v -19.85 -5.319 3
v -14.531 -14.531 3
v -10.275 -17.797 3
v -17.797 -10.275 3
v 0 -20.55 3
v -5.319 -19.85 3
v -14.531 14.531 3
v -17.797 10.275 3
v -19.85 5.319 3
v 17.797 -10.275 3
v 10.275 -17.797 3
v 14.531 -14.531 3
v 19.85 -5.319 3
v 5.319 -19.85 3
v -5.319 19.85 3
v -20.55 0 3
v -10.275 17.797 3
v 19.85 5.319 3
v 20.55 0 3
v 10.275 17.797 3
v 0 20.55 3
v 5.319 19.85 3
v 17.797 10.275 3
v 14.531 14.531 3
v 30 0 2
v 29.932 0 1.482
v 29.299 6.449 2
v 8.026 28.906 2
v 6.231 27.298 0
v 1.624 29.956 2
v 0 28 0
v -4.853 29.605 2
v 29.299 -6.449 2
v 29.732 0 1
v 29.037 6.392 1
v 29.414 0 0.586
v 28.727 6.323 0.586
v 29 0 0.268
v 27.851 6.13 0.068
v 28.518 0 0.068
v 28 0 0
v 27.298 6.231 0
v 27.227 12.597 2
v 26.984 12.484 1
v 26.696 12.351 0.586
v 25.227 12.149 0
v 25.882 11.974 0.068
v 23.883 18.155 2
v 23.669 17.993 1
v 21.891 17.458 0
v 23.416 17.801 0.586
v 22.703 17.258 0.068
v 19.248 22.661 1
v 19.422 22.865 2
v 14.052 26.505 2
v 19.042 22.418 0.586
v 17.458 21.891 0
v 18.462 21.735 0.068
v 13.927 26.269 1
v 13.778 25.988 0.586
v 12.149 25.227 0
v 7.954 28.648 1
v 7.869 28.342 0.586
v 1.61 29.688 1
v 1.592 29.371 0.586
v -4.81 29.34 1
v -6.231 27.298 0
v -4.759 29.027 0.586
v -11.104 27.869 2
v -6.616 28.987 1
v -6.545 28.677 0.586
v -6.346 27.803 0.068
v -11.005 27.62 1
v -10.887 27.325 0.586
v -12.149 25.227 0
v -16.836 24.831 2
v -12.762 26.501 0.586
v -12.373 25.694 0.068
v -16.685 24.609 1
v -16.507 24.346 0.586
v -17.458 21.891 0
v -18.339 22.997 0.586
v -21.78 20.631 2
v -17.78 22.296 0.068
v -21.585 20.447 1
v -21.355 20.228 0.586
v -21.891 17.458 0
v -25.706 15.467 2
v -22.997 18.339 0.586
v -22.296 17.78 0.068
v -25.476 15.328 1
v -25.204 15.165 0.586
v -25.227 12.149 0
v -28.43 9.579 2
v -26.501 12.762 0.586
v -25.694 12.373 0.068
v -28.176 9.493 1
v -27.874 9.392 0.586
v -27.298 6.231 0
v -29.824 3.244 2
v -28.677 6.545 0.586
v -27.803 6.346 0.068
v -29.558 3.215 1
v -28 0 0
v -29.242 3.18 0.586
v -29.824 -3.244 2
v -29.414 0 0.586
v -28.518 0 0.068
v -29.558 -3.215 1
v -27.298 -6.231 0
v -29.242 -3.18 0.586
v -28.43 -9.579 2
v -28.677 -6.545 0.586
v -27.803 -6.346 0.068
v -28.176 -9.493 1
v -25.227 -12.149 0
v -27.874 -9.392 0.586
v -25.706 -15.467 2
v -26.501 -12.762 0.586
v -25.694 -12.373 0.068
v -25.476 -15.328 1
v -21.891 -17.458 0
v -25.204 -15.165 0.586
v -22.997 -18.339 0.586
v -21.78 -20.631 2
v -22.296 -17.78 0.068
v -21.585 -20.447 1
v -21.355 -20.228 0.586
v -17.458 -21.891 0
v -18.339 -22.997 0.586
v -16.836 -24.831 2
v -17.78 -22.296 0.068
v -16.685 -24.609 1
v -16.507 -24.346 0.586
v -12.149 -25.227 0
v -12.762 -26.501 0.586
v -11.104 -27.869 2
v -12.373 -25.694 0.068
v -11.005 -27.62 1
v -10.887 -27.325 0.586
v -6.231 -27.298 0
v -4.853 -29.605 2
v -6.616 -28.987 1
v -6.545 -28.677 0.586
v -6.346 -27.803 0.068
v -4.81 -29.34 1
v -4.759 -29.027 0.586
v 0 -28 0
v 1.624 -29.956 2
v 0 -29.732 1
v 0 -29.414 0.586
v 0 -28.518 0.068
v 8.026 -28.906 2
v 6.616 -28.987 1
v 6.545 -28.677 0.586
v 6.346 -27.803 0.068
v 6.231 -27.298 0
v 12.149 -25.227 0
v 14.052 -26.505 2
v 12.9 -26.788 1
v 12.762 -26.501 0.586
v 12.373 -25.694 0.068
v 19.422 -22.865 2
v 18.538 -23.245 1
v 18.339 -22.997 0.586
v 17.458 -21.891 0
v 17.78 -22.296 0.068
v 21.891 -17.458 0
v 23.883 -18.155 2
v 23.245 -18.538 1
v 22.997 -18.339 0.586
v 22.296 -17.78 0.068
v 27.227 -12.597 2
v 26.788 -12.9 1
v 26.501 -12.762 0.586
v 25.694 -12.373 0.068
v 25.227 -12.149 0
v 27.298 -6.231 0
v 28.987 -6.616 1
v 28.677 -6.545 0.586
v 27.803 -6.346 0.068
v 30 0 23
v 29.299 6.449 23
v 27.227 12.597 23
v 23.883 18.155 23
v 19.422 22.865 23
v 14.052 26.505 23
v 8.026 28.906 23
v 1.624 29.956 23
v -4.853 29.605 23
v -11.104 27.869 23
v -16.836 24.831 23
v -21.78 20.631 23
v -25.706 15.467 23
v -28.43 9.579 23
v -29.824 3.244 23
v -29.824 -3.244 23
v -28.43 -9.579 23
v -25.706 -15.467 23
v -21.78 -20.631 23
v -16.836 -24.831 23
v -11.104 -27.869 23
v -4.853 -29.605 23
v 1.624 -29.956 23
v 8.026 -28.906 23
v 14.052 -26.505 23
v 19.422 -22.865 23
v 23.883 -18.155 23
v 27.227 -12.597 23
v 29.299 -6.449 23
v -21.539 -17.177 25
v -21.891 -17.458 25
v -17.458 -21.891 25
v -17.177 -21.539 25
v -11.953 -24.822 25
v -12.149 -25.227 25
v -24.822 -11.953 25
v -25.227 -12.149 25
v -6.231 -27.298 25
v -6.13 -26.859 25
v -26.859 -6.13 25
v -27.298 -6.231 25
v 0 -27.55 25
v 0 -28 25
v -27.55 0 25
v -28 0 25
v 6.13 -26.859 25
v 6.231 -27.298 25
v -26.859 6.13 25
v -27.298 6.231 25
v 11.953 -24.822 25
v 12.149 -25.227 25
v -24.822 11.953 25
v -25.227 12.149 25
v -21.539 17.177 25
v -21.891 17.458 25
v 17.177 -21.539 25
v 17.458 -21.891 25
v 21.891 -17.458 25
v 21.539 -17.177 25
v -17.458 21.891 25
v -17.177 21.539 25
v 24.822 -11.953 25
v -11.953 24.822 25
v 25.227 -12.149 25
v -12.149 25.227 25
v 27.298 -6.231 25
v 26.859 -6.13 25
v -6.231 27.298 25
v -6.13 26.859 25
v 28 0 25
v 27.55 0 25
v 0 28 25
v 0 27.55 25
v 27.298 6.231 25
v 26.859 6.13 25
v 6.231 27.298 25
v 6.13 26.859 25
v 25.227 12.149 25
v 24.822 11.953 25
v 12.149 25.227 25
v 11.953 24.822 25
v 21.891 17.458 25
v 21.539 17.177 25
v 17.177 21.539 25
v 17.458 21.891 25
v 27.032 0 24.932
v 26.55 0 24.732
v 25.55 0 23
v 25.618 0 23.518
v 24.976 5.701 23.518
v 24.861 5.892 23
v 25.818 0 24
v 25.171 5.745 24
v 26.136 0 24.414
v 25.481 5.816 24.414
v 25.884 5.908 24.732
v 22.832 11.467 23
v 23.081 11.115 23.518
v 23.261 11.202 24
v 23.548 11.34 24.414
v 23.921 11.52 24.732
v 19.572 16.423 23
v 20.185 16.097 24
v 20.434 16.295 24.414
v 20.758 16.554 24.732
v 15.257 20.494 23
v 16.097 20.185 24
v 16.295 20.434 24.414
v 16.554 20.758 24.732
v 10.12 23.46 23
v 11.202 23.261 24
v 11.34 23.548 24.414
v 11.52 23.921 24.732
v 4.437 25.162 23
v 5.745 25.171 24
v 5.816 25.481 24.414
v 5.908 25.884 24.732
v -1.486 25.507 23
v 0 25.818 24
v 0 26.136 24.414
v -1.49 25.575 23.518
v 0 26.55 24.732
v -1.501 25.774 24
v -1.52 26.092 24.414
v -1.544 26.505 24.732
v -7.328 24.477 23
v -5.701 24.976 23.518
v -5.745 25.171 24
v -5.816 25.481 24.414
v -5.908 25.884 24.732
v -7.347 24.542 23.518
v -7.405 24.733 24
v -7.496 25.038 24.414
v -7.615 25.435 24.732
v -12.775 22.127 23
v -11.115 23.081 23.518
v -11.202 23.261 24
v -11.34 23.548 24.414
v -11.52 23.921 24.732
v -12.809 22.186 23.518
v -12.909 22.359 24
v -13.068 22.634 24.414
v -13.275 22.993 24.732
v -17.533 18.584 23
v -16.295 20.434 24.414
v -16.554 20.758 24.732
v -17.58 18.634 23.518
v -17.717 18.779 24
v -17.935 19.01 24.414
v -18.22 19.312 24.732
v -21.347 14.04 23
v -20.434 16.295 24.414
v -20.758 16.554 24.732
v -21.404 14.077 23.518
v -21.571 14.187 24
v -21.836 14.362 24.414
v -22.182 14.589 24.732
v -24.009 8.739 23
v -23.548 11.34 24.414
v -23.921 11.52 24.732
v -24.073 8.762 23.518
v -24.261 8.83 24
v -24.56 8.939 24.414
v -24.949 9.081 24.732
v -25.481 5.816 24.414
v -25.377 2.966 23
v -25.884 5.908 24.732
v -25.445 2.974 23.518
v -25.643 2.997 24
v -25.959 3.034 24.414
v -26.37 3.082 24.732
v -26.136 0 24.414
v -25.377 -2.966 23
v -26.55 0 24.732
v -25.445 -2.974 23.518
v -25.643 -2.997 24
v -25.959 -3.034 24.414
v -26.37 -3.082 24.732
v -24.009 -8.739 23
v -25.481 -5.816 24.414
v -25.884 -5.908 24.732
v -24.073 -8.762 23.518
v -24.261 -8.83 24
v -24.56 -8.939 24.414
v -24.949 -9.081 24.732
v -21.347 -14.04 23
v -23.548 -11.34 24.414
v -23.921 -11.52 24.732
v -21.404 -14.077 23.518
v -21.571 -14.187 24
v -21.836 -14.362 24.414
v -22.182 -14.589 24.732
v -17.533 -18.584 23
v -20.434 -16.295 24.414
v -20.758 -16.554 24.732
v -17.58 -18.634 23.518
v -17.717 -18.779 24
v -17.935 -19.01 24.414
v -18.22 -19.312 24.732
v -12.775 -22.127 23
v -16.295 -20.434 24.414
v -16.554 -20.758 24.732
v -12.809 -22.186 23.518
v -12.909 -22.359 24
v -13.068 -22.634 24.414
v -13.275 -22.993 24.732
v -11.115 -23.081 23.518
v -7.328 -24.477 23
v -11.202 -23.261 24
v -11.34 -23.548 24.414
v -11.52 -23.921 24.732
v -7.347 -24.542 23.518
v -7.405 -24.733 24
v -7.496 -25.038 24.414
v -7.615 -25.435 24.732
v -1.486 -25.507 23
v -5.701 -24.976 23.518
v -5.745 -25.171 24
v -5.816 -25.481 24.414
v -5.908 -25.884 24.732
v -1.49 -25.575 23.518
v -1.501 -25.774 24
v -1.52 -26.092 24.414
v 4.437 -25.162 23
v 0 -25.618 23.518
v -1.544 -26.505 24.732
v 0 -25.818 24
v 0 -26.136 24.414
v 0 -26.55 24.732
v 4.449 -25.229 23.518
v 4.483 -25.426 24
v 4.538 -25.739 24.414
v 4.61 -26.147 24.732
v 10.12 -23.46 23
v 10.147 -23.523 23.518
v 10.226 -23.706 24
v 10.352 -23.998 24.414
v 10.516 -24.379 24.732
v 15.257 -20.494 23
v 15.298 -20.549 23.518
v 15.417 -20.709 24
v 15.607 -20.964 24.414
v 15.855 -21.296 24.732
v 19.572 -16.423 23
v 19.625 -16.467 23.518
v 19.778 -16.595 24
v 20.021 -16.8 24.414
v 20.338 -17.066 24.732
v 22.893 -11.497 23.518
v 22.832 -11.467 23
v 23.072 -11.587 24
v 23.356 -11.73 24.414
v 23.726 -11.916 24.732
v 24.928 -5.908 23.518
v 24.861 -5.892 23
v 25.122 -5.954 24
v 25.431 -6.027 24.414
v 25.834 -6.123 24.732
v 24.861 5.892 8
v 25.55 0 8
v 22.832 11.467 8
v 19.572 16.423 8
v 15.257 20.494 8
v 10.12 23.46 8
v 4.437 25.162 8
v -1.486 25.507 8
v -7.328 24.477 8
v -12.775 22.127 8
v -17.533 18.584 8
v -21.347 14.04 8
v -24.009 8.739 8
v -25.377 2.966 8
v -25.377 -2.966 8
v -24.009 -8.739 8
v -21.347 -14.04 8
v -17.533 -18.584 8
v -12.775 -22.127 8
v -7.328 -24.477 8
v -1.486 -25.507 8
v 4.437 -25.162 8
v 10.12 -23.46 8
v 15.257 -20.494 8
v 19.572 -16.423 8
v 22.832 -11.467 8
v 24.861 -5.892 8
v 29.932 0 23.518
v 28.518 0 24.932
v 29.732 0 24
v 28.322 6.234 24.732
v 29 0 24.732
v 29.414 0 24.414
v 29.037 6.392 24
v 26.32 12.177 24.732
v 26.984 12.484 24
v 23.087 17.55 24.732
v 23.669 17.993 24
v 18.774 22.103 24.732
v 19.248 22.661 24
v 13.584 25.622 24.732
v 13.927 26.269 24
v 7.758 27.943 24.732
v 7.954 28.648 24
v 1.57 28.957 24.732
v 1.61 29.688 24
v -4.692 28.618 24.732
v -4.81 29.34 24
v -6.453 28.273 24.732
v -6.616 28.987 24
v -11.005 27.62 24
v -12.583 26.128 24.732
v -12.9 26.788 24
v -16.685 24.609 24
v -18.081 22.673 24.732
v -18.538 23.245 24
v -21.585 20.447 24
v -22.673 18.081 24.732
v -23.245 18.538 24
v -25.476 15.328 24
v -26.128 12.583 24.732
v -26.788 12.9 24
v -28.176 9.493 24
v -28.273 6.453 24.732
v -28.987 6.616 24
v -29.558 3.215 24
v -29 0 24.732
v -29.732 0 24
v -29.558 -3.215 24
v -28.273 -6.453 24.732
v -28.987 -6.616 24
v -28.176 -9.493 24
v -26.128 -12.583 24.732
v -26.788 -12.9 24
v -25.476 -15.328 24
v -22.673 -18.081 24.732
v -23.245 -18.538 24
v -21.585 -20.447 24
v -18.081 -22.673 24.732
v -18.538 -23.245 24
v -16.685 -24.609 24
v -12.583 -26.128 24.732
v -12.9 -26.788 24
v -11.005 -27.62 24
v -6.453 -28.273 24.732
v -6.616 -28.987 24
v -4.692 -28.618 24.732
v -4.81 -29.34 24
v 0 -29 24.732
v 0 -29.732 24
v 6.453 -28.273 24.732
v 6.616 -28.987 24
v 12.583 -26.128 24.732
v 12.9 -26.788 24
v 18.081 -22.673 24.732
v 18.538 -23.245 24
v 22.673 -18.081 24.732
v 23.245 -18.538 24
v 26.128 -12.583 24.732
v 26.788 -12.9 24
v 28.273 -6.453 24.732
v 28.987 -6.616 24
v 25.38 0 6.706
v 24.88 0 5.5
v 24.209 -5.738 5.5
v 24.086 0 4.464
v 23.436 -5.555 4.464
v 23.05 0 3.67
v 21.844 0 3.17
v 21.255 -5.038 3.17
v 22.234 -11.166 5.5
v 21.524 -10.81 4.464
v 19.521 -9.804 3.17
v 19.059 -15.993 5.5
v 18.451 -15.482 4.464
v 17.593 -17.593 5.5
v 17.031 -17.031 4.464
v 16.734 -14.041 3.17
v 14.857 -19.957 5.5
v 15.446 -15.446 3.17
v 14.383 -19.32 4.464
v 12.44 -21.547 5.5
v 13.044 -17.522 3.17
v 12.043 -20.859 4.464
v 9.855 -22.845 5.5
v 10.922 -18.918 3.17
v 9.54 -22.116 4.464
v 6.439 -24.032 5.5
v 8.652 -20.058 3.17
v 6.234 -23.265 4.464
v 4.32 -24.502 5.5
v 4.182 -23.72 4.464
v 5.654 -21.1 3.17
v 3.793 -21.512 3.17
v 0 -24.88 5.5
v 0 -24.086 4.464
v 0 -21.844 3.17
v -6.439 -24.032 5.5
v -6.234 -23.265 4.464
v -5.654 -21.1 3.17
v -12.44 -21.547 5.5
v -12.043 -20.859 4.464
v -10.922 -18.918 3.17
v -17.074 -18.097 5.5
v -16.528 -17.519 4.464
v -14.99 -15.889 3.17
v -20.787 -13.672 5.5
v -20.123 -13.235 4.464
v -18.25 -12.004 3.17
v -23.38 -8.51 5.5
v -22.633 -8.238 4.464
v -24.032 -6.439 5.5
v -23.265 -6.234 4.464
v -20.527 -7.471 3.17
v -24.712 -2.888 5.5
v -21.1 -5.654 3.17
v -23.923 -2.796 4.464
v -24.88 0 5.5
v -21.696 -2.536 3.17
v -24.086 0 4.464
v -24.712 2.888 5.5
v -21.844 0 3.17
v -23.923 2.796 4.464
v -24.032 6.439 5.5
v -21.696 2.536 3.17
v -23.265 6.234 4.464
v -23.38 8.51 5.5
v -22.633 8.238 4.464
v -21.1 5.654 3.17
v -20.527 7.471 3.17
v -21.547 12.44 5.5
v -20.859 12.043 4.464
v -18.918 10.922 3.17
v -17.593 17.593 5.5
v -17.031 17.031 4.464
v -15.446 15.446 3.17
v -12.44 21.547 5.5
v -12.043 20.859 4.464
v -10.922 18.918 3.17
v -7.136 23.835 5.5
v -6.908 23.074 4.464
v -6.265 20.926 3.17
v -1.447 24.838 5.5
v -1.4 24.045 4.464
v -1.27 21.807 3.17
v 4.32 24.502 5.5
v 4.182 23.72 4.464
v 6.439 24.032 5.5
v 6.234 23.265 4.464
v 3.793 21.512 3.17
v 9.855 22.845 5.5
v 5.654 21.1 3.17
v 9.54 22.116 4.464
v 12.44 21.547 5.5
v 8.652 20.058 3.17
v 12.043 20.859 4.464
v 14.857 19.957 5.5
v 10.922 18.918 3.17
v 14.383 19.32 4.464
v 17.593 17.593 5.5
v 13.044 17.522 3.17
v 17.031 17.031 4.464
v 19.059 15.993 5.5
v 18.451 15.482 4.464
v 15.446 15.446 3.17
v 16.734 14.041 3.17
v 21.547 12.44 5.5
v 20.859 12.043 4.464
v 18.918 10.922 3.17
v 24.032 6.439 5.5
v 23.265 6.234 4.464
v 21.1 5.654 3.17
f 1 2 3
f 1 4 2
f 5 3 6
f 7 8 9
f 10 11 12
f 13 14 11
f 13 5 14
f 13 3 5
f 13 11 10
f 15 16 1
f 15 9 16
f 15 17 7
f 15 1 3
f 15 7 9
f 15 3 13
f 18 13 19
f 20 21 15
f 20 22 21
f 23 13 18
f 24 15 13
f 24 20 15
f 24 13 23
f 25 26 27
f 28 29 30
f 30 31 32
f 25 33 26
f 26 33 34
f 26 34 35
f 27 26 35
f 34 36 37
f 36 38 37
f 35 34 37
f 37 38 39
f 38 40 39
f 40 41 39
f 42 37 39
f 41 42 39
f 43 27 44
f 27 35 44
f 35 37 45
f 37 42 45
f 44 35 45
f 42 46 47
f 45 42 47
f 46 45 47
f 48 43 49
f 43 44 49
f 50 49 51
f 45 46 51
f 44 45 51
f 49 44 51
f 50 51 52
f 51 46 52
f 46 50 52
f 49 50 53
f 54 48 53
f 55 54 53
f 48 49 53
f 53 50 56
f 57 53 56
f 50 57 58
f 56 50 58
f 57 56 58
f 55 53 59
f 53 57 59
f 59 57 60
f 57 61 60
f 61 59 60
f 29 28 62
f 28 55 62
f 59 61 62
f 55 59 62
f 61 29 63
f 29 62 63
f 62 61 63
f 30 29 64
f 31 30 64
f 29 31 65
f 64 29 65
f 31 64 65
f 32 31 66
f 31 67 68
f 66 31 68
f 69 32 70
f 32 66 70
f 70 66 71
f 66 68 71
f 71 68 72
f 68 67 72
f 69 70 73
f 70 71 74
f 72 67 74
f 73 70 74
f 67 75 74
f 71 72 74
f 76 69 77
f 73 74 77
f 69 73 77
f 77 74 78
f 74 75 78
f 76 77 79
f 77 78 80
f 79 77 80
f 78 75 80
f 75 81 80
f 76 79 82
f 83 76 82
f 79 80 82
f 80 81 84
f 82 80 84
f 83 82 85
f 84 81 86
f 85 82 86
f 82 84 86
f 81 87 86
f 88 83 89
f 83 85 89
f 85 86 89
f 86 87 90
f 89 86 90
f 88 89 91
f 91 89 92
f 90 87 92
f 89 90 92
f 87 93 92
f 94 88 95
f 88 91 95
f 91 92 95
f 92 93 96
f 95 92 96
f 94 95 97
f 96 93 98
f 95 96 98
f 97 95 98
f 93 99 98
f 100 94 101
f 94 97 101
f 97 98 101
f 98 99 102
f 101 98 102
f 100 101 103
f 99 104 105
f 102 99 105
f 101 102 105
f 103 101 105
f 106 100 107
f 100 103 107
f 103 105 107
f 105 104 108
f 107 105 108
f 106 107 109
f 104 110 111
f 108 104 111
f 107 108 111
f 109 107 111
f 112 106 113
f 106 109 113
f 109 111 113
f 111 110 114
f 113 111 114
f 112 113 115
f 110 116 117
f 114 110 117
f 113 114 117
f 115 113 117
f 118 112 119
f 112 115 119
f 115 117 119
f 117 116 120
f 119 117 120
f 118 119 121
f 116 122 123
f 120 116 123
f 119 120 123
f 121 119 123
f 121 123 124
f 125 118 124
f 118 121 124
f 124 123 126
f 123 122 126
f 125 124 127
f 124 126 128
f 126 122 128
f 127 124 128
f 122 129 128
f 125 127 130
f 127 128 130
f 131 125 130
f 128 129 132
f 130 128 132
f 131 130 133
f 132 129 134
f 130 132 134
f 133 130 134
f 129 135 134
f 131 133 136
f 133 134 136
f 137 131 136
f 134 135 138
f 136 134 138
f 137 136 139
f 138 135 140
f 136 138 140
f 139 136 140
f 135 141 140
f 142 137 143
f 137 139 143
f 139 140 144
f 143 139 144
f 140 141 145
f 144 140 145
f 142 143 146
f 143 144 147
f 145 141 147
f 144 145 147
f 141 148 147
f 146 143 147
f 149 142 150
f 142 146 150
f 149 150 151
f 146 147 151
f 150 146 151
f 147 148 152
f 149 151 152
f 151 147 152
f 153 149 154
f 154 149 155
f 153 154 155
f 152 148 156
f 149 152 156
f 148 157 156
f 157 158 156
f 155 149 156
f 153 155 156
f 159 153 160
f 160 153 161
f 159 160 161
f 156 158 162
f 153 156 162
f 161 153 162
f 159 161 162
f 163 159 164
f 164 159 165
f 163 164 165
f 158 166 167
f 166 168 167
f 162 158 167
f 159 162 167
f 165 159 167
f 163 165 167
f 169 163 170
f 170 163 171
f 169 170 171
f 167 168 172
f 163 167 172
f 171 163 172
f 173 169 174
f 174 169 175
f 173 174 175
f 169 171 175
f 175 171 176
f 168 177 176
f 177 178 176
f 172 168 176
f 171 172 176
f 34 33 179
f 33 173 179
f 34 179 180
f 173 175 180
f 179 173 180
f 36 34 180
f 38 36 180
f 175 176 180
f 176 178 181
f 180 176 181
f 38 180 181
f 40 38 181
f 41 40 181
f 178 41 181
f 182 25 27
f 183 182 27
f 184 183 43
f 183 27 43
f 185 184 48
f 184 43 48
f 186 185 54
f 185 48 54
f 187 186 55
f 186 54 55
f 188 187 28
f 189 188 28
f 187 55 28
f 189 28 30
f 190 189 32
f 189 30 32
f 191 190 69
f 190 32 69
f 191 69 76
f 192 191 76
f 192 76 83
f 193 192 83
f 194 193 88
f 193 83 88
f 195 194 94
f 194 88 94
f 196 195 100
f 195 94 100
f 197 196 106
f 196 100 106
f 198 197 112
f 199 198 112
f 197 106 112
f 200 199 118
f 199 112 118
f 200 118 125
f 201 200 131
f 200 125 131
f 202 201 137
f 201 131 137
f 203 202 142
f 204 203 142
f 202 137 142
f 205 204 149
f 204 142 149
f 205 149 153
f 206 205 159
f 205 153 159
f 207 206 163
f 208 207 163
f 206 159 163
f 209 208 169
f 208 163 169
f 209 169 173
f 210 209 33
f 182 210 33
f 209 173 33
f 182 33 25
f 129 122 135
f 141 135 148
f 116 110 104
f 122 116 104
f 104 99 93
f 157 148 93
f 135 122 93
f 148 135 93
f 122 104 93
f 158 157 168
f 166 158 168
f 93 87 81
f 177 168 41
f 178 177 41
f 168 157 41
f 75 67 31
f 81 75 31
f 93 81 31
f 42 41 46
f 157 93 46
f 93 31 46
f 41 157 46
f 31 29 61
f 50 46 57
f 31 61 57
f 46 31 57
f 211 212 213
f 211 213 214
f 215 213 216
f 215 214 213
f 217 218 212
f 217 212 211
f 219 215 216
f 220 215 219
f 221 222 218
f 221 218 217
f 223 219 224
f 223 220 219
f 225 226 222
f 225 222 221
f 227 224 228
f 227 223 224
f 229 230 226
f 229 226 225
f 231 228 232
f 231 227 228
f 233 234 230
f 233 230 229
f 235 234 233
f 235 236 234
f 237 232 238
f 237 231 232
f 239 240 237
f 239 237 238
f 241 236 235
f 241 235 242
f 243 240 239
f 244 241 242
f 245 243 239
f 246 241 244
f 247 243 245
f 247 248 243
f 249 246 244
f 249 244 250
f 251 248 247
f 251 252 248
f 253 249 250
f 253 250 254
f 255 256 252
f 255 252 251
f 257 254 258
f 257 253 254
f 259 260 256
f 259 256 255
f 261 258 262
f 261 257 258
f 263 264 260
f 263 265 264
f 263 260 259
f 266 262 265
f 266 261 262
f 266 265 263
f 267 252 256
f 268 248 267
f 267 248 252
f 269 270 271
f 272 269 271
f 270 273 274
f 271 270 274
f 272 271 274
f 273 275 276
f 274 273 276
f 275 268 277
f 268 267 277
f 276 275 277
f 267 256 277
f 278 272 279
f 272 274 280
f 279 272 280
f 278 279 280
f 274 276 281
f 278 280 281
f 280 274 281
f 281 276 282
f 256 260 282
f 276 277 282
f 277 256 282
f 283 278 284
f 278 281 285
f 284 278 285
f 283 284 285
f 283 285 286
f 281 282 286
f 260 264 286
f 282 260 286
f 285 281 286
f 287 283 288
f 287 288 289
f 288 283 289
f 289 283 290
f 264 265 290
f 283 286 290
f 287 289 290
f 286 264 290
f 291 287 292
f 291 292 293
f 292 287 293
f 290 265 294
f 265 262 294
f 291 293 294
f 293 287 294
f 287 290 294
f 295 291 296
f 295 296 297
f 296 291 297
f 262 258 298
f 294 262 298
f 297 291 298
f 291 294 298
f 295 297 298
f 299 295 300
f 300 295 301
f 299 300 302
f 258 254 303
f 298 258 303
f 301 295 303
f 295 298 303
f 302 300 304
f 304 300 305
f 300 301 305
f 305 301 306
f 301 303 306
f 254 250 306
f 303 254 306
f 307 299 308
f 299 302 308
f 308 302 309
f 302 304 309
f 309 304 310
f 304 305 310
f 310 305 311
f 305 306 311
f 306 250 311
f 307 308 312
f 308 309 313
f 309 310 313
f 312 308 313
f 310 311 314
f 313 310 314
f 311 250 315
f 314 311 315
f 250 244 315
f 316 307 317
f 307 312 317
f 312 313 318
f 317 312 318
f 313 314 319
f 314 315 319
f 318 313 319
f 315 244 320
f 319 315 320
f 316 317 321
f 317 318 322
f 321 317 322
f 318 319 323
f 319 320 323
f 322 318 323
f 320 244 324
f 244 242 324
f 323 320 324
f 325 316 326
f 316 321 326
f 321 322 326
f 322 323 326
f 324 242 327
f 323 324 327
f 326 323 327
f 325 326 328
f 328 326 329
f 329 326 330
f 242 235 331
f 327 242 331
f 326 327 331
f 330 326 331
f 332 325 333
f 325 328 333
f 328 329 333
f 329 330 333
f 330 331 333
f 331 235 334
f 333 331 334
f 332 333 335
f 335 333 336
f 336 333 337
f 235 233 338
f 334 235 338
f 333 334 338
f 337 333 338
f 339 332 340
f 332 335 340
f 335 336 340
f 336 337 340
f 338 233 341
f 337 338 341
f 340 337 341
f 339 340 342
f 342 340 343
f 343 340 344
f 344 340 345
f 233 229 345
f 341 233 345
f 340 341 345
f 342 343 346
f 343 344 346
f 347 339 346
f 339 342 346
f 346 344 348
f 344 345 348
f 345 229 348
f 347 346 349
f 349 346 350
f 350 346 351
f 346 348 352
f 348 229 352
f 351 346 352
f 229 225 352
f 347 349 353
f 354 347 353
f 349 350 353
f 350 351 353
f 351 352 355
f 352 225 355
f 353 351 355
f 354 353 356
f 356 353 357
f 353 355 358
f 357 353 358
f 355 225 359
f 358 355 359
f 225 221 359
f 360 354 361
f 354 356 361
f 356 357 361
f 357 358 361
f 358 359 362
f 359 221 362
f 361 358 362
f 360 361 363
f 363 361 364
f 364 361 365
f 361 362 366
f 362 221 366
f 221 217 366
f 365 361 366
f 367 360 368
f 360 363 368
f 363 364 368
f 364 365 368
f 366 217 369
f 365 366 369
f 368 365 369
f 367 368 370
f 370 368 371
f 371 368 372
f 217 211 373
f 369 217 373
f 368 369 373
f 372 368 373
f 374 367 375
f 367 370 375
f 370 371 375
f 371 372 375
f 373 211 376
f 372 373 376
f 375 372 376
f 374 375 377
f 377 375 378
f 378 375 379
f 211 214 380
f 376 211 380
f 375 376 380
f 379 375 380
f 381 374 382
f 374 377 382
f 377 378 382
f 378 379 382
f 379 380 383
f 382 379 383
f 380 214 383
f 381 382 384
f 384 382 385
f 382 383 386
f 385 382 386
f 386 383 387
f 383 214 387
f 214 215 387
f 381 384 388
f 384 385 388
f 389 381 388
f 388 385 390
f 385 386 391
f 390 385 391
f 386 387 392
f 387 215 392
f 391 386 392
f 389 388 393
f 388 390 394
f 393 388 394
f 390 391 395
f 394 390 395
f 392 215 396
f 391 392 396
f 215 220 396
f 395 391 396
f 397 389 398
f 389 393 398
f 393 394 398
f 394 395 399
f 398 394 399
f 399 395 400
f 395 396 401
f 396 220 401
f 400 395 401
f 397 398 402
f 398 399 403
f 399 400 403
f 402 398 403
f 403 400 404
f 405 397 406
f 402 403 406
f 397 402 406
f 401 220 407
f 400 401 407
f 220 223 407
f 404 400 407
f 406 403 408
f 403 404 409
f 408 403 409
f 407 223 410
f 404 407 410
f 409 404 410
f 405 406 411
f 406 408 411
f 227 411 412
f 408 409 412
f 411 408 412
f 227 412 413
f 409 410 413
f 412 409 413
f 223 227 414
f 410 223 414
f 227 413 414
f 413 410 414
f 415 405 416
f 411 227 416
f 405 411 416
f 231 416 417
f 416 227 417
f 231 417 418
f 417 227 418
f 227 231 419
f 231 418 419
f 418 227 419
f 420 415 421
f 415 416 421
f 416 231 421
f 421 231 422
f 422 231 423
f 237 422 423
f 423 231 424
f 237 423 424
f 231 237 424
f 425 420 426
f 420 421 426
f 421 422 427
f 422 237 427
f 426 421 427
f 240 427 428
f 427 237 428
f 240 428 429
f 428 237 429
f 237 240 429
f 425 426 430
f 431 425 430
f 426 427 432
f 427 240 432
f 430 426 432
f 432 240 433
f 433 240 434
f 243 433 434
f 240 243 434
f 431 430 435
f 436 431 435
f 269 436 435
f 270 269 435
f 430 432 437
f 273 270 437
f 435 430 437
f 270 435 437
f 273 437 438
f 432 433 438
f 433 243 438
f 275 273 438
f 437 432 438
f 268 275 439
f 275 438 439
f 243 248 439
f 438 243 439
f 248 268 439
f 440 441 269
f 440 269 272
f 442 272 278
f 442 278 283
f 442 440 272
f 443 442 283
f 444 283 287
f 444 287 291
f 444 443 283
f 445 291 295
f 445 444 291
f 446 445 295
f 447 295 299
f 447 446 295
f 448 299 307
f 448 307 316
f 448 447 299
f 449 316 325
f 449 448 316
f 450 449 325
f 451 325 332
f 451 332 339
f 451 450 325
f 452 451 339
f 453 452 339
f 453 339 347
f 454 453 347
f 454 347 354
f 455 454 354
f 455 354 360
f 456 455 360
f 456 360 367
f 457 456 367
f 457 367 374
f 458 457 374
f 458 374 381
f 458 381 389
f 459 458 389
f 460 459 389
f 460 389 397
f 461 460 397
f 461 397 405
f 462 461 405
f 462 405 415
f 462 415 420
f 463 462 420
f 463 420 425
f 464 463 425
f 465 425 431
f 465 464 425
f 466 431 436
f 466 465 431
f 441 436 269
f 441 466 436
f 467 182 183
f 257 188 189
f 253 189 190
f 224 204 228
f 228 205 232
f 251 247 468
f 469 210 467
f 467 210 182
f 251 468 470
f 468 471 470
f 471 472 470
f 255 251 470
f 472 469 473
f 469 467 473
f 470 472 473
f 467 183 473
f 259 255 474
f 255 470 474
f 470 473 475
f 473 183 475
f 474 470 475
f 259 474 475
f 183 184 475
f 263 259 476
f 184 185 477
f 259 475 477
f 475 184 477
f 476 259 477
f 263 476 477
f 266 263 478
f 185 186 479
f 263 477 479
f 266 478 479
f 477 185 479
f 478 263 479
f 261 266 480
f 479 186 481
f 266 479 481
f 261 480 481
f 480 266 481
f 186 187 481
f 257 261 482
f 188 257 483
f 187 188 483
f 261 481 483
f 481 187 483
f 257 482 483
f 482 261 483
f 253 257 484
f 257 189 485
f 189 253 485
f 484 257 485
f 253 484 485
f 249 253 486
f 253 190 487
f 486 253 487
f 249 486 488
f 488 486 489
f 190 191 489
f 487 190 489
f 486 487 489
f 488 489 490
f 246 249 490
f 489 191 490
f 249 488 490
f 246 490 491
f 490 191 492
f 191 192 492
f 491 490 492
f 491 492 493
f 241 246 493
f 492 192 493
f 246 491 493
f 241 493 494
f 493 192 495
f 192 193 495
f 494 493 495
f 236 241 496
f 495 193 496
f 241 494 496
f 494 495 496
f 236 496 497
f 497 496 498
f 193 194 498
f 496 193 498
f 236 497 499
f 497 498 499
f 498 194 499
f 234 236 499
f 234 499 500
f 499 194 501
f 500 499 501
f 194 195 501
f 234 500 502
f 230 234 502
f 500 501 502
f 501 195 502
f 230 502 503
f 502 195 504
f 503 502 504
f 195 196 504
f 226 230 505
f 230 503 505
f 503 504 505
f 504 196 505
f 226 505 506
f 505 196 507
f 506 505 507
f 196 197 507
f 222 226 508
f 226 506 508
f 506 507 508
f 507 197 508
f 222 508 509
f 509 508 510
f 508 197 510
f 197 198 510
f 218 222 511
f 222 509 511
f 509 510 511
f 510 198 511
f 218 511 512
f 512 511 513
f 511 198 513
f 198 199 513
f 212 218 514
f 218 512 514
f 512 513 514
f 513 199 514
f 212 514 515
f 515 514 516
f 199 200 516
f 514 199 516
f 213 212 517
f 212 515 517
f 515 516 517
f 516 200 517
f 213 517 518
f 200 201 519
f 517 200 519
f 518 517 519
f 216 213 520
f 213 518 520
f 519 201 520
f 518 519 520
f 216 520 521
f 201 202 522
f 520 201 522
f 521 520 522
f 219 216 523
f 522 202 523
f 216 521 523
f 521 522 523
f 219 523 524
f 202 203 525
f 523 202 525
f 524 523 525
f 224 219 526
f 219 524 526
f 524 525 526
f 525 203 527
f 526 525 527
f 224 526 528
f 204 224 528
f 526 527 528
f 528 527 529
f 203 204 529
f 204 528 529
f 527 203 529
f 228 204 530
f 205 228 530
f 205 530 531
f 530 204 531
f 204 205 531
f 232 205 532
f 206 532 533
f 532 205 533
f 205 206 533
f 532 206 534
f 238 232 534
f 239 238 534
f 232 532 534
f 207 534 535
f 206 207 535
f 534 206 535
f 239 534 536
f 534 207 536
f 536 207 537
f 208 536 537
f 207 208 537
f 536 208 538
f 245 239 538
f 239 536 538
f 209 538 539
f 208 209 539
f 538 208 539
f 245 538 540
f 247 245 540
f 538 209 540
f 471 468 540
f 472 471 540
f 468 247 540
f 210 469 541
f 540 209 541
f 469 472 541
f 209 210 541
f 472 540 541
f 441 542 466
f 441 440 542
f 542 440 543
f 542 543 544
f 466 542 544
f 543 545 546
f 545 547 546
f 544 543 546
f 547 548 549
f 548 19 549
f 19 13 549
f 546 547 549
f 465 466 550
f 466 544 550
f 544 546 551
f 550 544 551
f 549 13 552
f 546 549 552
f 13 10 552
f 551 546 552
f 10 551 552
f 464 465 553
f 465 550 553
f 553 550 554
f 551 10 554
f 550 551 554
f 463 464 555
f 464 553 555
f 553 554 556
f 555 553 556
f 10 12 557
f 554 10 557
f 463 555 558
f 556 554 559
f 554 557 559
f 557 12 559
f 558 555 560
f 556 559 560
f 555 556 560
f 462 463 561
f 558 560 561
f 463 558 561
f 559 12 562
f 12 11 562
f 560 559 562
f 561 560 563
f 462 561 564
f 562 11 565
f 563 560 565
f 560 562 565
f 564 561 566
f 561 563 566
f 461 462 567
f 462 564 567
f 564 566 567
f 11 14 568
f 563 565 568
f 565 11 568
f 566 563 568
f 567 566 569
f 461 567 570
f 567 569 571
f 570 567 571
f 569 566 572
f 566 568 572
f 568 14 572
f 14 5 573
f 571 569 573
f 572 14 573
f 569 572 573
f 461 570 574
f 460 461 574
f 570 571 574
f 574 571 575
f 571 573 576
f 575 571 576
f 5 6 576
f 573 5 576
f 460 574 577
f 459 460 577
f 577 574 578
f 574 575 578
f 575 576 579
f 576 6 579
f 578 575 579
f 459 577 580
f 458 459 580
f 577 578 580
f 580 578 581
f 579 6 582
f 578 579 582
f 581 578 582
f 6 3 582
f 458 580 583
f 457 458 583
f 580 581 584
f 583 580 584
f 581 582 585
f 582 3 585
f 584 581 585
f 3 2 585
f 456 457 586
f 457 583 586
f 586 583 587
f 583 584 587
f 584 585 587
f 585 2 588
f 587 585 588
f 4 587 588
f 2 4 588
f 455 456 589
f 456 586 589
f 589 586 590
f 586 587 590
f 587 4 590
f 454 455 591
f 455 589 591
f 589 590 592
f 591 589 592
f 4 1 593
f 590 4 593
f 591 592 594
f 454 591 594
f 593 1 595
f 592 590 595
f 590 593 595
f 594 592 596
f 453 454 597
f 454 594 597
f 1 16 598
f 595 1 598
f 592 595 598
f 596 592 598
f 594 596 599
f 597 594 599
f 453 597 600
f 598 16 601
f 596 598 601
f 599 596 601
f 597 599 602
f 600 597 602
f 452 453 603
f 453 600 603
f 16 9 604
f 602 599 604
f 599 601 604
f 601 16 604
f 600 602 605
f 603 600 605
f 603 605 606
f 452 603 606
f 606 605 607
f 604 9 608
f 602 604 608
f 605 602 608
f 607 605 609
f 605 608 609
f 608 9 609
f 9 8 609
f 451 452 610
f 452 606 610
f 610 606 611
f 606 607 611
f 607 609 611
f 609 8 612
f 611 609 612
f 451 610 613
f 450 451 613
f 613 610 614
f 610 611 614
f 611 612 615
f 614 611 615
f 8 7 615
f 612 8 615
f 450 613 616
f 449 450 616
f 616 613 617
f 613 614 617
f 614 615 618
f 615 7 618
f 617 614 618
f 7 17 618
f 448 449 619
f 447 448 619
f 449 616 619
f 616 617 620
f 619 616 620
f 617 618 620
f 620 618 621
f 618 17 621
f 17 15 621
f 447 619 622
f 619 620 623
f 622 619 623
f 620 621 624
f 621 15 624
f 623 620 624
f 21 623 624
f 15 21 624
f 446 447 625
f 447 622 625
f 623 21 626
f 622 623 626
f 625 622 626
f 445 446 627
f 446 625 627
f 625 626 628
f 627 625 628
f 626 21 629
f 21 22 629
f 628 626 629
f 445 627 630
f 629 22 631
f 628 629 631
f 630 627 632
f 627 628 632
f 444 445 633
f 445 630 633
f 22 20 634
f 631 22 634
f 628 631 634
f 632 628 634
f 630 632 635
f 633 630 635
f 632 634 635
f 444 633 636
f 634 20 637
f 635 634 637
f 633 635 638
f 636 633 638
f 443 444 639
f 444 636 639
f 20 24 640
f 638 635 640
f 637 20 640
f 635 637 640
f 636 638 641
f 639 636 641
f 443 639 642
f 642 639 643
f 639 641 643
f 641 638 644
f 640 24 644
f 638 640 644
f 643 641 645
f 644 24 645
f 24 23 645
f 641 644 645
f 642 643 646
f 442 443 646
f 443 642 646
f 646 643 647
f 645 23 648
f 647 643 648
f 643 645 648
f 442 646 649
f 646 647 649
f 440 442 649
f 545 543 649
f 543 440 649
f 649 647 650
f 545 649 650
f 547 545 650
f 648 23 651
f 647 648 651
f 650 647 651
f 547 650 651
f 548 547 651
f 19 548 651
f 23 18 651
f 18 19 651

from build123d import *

# Parameters (mm, degrees)
F0_R     = 30
F0_R_2   = 25.55
F1_DEPTH = 3
F2_DEPTH = 25
F3_R     = 5
F4_R     = 2
F0_R_3   = 40
F0_R_4   = 30.5
F5_DEPTH = 27.3
F6_R     = 2


with BuildPart() as f1:
    # F0 (on Top) → F1 (new body)
    with BuildSketch(Plane.XY):
        Circle(F0_R)
        Circle(F0_R_2, mode=Mode.SUBTRACT)
        Circle(F0_R_2)
    extrude(amount=F1_DEPTH)

    # F0 (on Top) → F2 (join)
    with BuildSketch(Plane.XY):
        Circle(F0_R)
        Circle(F0_R_2, mode=Mode.SUBTRACT)
    extrude(amount=F2_DEPTH)

    # F3
    f3_edges = [f1.edges().sort_by_distance(p)[0] for p in [
        (-25.55, 0, 3),
    ]]
    fillet(f3_edges, radius=F3_R)

    # F4
    f4_edges = [f1.edges().sort_by_distance(p)[0] for p in [
        (-25.55, 0, 25),
        (-30, 0, 25),
    ]]
    fillet(f4_edges, radius=F4_R)

    # F0 (on Top) → F5 (cut)
    with BuildSketch(Plane.XY):
        Circle(F0_R_3)
        Circle(F0_R_4, mode=Mode.SUBTRACT)
    extrude(amount=F5_DEPTH, mode=Mode.SUBTRACT)

    # F6
    f6_edges = [f1.edges().sort_by_distance(p)[0] for p in [
        (-30, 0, 0),
    ]]
    fillet(f6_edges, radius=F6_R)


solid = f1.part
